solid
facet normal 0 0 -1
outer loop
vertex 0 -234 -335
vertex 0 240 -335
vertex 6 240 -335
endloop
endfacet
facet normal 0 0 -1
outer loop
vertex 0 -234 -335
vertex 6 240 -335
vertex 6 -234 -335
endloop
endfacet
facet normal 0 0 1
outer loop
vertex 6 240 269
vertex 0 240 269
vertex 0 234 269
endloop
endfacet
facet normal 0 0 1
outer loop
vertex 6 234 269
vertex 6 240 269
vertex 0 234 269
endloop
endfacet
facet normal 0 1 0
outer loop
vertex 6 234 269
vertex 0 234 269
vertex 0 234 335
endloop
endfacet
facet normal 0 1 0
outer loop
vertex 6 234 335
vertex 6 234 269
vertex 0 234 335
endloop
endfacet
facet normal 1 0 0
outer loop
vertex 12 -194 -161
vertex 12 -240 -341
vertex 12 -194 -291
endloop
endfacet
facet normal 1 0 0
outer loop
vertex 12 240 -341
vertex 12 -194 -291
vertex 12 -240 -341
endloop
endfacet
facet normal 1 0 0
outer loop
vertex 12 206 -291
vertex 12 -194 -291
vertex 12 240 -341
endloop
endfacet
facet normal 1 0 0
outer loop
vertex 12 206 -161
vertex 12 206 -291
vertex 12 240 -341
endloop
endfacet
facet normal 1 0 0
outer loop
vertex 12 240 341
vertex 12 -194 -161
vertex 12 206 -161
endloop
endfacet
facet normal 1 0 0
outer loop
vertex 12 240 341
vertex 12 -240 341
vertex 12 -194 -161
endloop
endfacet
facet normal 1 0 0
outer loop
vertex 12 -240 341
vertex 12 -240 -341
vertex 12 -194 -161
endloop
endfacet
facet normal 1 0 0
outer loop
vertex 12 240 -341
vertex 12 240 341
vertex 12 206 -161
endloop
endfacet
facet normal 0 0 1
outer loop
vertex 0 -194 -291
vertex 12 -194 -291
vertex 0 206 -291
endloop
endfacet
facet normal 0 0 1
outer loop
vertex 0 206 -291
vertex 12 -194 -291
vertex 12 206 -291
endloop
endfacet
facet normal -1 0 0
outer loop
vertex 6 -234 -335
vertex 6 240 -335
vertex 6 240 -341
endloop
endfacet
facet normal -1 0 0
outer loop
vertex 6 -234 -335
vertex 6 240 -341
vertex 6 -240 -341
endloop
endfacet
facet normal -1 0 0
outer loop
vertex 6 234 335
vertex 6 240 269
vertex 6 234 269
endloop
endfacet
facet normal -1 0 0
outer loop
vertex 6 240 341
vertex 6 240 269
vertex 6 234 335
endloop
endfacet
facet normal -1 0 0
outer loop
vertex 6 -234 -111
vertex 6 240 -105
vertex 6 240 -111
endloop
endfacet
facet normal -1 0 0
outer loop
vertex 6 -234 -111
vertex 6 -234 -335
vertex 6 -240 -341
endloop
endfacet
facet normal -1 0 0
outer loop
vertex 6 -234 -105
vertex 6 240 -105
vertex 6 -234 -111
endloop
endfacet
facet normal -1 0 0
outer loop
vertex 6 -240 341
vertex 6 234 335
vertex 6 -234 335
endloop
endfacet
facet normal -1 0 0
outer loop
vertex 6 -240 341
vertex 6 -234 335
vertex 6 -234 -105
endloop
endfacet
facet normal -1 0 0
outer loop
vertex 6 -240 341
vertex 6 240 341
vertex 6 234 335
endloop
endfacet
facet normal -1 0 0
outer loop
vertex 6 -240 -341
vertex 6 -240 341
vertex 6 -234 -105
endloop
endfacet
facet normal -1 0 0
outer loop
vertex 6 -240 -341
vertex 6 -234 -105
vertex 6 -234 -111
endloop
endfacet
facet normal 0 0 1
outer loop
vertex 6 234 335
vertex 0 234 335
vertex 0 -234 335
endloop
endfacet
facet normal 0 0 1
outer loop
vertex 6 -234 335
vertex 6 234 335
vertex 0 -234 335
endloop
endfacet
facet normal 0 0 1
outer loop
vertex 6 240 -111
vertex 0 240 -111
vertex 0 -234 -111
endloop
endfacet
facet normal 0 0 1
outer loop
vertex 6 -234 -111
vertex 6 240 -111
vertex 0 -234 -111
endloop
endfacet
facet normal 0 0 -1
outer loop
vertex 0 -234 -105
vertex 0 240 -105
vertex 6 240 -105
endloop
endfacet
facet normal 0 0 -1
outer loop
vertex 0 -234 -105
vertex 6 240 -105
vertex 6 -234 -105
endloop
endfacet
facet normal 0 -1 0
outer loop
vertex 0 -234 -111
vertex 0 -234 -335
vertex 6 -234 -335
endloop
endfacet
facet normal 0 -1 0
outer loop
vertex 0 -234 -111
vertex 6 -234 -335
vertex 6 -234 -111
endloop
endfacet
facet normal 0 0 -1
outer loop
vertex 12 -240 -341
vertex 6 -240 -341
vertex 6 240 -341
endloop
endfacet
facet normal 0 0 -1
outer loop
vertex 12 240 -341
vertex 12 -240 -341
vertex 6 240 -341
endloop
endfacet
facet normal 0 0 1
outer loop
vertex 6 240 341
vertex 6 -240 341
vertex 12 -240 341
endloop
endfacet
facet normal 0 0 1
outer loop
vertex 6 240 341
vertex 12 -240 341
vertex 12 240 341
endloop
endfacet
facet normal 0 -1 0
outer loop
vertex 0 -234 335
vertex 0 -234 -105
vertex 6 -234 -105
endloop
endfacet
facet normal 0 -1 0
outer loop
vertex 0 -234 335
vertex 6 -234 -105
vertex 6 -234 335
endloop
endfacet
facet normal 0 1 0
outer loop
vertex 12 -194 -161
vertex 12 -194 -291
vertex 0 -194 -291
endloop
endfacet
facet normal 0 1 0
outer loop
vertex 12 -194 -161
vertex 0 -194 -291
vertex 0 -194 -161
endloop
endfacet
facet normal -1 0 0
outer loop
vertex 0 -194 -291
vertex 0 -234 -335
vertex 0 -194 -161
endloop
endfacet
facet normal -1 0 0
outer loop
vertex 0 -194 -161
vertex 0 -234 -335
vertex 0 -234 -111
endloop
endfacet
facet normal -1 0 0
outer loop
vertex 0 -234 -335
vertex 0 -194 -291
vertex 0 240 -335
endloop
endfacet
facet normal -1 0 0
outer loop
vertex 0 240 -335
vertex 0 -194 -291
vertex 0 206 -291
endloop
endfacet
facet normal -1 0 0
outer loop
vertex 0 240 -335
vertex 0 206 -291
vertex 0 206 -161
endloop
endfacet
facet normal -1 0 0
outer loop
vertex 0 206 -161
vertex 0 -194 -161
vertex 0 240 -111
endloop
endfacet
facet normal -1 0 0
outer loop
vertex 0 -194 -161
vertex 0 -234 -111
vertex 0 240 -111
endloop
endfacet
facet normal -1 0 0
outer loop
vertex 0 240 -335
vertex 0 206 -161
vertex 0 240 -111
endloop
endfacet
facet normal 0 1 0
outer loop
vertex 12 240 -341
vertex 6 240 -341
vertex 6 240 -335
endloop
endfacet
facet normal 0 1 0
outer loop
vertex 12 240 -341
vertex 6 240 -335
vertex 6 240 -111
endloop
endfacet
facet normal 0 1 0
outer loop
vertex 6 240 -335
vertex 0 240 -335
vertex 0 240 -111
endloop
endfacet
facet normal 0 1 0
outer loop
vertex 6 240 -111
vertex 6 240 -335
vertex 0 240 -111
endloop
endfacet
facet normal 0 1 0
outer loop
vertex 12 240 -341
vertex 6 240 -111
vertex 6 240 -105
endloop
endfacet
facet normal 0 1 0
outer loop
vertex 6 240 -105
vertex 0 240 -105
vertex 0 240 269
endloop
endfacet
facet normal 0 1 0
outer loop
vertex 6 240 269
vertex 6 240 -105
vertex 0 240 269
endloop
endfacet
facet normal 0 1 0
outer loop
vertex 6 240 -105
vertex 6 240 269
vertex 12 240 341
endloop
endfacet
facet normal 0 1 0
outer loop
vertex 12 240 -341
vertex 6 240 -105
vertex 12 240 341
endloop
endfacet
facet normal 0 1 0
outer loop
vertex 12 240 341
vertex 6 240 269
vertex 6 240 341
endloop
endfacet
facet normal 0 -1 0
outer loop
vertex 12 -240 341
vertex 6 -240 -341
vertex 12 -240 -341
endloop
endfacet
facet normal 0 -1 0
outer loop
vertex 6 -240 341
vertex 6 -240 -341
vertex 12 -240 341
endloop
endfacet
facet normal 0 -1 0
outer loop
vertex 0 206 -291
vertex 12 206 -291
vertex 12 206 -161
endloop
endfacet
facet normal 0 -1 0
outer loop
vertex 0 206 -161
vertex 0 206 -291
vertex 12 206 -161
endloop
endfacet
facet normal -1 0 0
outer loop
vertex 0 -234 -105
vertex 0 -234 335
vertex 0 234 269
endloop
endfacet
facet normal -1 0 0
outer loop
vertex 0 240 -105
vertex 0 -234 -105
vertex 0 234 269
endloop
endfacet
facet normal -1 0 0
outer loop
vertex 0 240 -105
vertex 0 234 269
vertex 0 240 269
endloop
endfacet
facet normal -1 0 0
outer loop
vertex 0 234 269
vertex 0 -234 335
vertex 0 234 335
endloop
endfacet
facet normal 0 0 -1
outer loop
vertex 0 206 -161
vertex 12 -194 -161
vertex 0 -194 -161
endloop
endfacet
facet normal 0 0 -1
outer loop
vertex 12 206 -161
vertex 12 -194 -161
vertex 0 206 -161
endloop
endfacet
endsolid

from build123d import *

# Parameters (mm, degrees)
F0_W      = 480
F0_H      = 682
F1_DEPTH  = 12
F2_W      = 6
F2_H      = 682
F3_DEPTH  = 6
F4_W      = 474
F4_H      = 6
F5_DEPTH  = 6
F6_W      = 6
F6_H      = 66
F7_DEPTH  = 6
F8_W      = 474
F8_H      = 6
F9_DEPTH  = 6
F10_W     = 400
F10_H     = 130
F11_DEPTH = 12
F12_W     = 474
F12_H     = 6
F13_DEPTH = 6


with BuildPart() as f1:
    # F0 (on Right) → F1 (new body)
    with BuildSketch(Plane.YZ):
        Rectangle(F0_W, F0_H)
    extrude(amount=F1_DEPTH)

    # F2 (on face) → F3 (cut)
    with BuildSketch(Plane(origin=(0, 0, 0), x_dir=(0, -1, 0), z_dir=(-1, 0, 0))):
        with Locations((237, 0)):
            Rectangle(F2_W, F2_H)
    extrude(amount=-F3_DEPTH, mode=Mode.SUBTRACT)

    # F4 (on face) → F5 (cut)
    with BuildSketch(Plane(origin=(0, 0, 0), x_dir=(0, -1, 0), z_dir=(-1, 0, 0))):
        with Locations((-3, 338)):
            Rectangle(F4_W, F4_H)
    extrude(amount=-F5_DEPTH, mode=Mode.SUBTRACT)

    # F6 (on face) → F7 (cut)
    with BuildSketch(Plane(origin=(0, 0, 0), x_dir=(0, -1, 0), z_dir=(-1, 0, 0))):
        with Locations((-237, 302)):
            Rectangle(F6_W, F6_H)
    extrude(amount=-F7_DEPTH, mode=Mode.SUBTRACT)

    # F8 (on face) → F9 (cut)
    with BuildSketch(Plane(origin=(0, 0, 0), x_dir=(0, -1, 0), z_dir=(-1, 0, 0))):
        with Locations((-3, -108)):
            Rectangle(F8_W, F8_H)
    extrude(amount=-F9_DEPTH, mode=Mode.SUBTRACT)

    # F10 (on face) → F11 (cut, through all)
    with BuildSketch(Plane.YZ.offset(12)):
        with Locations((6, -226)):
            Rectangle(F10_W, F10_H)
    extrude(amount=-F11_DEPTH, mode=Mode.SUBTRACT)

    # F12 (on face) → F13 (cut)
    with BuildSketch(Plane(origin=(0, 0, 0), x_dir=(0, -1, 0), z_dir=(-1, 0, 0))):
        with Locations((-3, -338)):
            Rectangle(F12_W, F12_H)
    extrude(amount=-F13_DEPTH, mode=Mode.SUBTRACT)


solid = f1.part
